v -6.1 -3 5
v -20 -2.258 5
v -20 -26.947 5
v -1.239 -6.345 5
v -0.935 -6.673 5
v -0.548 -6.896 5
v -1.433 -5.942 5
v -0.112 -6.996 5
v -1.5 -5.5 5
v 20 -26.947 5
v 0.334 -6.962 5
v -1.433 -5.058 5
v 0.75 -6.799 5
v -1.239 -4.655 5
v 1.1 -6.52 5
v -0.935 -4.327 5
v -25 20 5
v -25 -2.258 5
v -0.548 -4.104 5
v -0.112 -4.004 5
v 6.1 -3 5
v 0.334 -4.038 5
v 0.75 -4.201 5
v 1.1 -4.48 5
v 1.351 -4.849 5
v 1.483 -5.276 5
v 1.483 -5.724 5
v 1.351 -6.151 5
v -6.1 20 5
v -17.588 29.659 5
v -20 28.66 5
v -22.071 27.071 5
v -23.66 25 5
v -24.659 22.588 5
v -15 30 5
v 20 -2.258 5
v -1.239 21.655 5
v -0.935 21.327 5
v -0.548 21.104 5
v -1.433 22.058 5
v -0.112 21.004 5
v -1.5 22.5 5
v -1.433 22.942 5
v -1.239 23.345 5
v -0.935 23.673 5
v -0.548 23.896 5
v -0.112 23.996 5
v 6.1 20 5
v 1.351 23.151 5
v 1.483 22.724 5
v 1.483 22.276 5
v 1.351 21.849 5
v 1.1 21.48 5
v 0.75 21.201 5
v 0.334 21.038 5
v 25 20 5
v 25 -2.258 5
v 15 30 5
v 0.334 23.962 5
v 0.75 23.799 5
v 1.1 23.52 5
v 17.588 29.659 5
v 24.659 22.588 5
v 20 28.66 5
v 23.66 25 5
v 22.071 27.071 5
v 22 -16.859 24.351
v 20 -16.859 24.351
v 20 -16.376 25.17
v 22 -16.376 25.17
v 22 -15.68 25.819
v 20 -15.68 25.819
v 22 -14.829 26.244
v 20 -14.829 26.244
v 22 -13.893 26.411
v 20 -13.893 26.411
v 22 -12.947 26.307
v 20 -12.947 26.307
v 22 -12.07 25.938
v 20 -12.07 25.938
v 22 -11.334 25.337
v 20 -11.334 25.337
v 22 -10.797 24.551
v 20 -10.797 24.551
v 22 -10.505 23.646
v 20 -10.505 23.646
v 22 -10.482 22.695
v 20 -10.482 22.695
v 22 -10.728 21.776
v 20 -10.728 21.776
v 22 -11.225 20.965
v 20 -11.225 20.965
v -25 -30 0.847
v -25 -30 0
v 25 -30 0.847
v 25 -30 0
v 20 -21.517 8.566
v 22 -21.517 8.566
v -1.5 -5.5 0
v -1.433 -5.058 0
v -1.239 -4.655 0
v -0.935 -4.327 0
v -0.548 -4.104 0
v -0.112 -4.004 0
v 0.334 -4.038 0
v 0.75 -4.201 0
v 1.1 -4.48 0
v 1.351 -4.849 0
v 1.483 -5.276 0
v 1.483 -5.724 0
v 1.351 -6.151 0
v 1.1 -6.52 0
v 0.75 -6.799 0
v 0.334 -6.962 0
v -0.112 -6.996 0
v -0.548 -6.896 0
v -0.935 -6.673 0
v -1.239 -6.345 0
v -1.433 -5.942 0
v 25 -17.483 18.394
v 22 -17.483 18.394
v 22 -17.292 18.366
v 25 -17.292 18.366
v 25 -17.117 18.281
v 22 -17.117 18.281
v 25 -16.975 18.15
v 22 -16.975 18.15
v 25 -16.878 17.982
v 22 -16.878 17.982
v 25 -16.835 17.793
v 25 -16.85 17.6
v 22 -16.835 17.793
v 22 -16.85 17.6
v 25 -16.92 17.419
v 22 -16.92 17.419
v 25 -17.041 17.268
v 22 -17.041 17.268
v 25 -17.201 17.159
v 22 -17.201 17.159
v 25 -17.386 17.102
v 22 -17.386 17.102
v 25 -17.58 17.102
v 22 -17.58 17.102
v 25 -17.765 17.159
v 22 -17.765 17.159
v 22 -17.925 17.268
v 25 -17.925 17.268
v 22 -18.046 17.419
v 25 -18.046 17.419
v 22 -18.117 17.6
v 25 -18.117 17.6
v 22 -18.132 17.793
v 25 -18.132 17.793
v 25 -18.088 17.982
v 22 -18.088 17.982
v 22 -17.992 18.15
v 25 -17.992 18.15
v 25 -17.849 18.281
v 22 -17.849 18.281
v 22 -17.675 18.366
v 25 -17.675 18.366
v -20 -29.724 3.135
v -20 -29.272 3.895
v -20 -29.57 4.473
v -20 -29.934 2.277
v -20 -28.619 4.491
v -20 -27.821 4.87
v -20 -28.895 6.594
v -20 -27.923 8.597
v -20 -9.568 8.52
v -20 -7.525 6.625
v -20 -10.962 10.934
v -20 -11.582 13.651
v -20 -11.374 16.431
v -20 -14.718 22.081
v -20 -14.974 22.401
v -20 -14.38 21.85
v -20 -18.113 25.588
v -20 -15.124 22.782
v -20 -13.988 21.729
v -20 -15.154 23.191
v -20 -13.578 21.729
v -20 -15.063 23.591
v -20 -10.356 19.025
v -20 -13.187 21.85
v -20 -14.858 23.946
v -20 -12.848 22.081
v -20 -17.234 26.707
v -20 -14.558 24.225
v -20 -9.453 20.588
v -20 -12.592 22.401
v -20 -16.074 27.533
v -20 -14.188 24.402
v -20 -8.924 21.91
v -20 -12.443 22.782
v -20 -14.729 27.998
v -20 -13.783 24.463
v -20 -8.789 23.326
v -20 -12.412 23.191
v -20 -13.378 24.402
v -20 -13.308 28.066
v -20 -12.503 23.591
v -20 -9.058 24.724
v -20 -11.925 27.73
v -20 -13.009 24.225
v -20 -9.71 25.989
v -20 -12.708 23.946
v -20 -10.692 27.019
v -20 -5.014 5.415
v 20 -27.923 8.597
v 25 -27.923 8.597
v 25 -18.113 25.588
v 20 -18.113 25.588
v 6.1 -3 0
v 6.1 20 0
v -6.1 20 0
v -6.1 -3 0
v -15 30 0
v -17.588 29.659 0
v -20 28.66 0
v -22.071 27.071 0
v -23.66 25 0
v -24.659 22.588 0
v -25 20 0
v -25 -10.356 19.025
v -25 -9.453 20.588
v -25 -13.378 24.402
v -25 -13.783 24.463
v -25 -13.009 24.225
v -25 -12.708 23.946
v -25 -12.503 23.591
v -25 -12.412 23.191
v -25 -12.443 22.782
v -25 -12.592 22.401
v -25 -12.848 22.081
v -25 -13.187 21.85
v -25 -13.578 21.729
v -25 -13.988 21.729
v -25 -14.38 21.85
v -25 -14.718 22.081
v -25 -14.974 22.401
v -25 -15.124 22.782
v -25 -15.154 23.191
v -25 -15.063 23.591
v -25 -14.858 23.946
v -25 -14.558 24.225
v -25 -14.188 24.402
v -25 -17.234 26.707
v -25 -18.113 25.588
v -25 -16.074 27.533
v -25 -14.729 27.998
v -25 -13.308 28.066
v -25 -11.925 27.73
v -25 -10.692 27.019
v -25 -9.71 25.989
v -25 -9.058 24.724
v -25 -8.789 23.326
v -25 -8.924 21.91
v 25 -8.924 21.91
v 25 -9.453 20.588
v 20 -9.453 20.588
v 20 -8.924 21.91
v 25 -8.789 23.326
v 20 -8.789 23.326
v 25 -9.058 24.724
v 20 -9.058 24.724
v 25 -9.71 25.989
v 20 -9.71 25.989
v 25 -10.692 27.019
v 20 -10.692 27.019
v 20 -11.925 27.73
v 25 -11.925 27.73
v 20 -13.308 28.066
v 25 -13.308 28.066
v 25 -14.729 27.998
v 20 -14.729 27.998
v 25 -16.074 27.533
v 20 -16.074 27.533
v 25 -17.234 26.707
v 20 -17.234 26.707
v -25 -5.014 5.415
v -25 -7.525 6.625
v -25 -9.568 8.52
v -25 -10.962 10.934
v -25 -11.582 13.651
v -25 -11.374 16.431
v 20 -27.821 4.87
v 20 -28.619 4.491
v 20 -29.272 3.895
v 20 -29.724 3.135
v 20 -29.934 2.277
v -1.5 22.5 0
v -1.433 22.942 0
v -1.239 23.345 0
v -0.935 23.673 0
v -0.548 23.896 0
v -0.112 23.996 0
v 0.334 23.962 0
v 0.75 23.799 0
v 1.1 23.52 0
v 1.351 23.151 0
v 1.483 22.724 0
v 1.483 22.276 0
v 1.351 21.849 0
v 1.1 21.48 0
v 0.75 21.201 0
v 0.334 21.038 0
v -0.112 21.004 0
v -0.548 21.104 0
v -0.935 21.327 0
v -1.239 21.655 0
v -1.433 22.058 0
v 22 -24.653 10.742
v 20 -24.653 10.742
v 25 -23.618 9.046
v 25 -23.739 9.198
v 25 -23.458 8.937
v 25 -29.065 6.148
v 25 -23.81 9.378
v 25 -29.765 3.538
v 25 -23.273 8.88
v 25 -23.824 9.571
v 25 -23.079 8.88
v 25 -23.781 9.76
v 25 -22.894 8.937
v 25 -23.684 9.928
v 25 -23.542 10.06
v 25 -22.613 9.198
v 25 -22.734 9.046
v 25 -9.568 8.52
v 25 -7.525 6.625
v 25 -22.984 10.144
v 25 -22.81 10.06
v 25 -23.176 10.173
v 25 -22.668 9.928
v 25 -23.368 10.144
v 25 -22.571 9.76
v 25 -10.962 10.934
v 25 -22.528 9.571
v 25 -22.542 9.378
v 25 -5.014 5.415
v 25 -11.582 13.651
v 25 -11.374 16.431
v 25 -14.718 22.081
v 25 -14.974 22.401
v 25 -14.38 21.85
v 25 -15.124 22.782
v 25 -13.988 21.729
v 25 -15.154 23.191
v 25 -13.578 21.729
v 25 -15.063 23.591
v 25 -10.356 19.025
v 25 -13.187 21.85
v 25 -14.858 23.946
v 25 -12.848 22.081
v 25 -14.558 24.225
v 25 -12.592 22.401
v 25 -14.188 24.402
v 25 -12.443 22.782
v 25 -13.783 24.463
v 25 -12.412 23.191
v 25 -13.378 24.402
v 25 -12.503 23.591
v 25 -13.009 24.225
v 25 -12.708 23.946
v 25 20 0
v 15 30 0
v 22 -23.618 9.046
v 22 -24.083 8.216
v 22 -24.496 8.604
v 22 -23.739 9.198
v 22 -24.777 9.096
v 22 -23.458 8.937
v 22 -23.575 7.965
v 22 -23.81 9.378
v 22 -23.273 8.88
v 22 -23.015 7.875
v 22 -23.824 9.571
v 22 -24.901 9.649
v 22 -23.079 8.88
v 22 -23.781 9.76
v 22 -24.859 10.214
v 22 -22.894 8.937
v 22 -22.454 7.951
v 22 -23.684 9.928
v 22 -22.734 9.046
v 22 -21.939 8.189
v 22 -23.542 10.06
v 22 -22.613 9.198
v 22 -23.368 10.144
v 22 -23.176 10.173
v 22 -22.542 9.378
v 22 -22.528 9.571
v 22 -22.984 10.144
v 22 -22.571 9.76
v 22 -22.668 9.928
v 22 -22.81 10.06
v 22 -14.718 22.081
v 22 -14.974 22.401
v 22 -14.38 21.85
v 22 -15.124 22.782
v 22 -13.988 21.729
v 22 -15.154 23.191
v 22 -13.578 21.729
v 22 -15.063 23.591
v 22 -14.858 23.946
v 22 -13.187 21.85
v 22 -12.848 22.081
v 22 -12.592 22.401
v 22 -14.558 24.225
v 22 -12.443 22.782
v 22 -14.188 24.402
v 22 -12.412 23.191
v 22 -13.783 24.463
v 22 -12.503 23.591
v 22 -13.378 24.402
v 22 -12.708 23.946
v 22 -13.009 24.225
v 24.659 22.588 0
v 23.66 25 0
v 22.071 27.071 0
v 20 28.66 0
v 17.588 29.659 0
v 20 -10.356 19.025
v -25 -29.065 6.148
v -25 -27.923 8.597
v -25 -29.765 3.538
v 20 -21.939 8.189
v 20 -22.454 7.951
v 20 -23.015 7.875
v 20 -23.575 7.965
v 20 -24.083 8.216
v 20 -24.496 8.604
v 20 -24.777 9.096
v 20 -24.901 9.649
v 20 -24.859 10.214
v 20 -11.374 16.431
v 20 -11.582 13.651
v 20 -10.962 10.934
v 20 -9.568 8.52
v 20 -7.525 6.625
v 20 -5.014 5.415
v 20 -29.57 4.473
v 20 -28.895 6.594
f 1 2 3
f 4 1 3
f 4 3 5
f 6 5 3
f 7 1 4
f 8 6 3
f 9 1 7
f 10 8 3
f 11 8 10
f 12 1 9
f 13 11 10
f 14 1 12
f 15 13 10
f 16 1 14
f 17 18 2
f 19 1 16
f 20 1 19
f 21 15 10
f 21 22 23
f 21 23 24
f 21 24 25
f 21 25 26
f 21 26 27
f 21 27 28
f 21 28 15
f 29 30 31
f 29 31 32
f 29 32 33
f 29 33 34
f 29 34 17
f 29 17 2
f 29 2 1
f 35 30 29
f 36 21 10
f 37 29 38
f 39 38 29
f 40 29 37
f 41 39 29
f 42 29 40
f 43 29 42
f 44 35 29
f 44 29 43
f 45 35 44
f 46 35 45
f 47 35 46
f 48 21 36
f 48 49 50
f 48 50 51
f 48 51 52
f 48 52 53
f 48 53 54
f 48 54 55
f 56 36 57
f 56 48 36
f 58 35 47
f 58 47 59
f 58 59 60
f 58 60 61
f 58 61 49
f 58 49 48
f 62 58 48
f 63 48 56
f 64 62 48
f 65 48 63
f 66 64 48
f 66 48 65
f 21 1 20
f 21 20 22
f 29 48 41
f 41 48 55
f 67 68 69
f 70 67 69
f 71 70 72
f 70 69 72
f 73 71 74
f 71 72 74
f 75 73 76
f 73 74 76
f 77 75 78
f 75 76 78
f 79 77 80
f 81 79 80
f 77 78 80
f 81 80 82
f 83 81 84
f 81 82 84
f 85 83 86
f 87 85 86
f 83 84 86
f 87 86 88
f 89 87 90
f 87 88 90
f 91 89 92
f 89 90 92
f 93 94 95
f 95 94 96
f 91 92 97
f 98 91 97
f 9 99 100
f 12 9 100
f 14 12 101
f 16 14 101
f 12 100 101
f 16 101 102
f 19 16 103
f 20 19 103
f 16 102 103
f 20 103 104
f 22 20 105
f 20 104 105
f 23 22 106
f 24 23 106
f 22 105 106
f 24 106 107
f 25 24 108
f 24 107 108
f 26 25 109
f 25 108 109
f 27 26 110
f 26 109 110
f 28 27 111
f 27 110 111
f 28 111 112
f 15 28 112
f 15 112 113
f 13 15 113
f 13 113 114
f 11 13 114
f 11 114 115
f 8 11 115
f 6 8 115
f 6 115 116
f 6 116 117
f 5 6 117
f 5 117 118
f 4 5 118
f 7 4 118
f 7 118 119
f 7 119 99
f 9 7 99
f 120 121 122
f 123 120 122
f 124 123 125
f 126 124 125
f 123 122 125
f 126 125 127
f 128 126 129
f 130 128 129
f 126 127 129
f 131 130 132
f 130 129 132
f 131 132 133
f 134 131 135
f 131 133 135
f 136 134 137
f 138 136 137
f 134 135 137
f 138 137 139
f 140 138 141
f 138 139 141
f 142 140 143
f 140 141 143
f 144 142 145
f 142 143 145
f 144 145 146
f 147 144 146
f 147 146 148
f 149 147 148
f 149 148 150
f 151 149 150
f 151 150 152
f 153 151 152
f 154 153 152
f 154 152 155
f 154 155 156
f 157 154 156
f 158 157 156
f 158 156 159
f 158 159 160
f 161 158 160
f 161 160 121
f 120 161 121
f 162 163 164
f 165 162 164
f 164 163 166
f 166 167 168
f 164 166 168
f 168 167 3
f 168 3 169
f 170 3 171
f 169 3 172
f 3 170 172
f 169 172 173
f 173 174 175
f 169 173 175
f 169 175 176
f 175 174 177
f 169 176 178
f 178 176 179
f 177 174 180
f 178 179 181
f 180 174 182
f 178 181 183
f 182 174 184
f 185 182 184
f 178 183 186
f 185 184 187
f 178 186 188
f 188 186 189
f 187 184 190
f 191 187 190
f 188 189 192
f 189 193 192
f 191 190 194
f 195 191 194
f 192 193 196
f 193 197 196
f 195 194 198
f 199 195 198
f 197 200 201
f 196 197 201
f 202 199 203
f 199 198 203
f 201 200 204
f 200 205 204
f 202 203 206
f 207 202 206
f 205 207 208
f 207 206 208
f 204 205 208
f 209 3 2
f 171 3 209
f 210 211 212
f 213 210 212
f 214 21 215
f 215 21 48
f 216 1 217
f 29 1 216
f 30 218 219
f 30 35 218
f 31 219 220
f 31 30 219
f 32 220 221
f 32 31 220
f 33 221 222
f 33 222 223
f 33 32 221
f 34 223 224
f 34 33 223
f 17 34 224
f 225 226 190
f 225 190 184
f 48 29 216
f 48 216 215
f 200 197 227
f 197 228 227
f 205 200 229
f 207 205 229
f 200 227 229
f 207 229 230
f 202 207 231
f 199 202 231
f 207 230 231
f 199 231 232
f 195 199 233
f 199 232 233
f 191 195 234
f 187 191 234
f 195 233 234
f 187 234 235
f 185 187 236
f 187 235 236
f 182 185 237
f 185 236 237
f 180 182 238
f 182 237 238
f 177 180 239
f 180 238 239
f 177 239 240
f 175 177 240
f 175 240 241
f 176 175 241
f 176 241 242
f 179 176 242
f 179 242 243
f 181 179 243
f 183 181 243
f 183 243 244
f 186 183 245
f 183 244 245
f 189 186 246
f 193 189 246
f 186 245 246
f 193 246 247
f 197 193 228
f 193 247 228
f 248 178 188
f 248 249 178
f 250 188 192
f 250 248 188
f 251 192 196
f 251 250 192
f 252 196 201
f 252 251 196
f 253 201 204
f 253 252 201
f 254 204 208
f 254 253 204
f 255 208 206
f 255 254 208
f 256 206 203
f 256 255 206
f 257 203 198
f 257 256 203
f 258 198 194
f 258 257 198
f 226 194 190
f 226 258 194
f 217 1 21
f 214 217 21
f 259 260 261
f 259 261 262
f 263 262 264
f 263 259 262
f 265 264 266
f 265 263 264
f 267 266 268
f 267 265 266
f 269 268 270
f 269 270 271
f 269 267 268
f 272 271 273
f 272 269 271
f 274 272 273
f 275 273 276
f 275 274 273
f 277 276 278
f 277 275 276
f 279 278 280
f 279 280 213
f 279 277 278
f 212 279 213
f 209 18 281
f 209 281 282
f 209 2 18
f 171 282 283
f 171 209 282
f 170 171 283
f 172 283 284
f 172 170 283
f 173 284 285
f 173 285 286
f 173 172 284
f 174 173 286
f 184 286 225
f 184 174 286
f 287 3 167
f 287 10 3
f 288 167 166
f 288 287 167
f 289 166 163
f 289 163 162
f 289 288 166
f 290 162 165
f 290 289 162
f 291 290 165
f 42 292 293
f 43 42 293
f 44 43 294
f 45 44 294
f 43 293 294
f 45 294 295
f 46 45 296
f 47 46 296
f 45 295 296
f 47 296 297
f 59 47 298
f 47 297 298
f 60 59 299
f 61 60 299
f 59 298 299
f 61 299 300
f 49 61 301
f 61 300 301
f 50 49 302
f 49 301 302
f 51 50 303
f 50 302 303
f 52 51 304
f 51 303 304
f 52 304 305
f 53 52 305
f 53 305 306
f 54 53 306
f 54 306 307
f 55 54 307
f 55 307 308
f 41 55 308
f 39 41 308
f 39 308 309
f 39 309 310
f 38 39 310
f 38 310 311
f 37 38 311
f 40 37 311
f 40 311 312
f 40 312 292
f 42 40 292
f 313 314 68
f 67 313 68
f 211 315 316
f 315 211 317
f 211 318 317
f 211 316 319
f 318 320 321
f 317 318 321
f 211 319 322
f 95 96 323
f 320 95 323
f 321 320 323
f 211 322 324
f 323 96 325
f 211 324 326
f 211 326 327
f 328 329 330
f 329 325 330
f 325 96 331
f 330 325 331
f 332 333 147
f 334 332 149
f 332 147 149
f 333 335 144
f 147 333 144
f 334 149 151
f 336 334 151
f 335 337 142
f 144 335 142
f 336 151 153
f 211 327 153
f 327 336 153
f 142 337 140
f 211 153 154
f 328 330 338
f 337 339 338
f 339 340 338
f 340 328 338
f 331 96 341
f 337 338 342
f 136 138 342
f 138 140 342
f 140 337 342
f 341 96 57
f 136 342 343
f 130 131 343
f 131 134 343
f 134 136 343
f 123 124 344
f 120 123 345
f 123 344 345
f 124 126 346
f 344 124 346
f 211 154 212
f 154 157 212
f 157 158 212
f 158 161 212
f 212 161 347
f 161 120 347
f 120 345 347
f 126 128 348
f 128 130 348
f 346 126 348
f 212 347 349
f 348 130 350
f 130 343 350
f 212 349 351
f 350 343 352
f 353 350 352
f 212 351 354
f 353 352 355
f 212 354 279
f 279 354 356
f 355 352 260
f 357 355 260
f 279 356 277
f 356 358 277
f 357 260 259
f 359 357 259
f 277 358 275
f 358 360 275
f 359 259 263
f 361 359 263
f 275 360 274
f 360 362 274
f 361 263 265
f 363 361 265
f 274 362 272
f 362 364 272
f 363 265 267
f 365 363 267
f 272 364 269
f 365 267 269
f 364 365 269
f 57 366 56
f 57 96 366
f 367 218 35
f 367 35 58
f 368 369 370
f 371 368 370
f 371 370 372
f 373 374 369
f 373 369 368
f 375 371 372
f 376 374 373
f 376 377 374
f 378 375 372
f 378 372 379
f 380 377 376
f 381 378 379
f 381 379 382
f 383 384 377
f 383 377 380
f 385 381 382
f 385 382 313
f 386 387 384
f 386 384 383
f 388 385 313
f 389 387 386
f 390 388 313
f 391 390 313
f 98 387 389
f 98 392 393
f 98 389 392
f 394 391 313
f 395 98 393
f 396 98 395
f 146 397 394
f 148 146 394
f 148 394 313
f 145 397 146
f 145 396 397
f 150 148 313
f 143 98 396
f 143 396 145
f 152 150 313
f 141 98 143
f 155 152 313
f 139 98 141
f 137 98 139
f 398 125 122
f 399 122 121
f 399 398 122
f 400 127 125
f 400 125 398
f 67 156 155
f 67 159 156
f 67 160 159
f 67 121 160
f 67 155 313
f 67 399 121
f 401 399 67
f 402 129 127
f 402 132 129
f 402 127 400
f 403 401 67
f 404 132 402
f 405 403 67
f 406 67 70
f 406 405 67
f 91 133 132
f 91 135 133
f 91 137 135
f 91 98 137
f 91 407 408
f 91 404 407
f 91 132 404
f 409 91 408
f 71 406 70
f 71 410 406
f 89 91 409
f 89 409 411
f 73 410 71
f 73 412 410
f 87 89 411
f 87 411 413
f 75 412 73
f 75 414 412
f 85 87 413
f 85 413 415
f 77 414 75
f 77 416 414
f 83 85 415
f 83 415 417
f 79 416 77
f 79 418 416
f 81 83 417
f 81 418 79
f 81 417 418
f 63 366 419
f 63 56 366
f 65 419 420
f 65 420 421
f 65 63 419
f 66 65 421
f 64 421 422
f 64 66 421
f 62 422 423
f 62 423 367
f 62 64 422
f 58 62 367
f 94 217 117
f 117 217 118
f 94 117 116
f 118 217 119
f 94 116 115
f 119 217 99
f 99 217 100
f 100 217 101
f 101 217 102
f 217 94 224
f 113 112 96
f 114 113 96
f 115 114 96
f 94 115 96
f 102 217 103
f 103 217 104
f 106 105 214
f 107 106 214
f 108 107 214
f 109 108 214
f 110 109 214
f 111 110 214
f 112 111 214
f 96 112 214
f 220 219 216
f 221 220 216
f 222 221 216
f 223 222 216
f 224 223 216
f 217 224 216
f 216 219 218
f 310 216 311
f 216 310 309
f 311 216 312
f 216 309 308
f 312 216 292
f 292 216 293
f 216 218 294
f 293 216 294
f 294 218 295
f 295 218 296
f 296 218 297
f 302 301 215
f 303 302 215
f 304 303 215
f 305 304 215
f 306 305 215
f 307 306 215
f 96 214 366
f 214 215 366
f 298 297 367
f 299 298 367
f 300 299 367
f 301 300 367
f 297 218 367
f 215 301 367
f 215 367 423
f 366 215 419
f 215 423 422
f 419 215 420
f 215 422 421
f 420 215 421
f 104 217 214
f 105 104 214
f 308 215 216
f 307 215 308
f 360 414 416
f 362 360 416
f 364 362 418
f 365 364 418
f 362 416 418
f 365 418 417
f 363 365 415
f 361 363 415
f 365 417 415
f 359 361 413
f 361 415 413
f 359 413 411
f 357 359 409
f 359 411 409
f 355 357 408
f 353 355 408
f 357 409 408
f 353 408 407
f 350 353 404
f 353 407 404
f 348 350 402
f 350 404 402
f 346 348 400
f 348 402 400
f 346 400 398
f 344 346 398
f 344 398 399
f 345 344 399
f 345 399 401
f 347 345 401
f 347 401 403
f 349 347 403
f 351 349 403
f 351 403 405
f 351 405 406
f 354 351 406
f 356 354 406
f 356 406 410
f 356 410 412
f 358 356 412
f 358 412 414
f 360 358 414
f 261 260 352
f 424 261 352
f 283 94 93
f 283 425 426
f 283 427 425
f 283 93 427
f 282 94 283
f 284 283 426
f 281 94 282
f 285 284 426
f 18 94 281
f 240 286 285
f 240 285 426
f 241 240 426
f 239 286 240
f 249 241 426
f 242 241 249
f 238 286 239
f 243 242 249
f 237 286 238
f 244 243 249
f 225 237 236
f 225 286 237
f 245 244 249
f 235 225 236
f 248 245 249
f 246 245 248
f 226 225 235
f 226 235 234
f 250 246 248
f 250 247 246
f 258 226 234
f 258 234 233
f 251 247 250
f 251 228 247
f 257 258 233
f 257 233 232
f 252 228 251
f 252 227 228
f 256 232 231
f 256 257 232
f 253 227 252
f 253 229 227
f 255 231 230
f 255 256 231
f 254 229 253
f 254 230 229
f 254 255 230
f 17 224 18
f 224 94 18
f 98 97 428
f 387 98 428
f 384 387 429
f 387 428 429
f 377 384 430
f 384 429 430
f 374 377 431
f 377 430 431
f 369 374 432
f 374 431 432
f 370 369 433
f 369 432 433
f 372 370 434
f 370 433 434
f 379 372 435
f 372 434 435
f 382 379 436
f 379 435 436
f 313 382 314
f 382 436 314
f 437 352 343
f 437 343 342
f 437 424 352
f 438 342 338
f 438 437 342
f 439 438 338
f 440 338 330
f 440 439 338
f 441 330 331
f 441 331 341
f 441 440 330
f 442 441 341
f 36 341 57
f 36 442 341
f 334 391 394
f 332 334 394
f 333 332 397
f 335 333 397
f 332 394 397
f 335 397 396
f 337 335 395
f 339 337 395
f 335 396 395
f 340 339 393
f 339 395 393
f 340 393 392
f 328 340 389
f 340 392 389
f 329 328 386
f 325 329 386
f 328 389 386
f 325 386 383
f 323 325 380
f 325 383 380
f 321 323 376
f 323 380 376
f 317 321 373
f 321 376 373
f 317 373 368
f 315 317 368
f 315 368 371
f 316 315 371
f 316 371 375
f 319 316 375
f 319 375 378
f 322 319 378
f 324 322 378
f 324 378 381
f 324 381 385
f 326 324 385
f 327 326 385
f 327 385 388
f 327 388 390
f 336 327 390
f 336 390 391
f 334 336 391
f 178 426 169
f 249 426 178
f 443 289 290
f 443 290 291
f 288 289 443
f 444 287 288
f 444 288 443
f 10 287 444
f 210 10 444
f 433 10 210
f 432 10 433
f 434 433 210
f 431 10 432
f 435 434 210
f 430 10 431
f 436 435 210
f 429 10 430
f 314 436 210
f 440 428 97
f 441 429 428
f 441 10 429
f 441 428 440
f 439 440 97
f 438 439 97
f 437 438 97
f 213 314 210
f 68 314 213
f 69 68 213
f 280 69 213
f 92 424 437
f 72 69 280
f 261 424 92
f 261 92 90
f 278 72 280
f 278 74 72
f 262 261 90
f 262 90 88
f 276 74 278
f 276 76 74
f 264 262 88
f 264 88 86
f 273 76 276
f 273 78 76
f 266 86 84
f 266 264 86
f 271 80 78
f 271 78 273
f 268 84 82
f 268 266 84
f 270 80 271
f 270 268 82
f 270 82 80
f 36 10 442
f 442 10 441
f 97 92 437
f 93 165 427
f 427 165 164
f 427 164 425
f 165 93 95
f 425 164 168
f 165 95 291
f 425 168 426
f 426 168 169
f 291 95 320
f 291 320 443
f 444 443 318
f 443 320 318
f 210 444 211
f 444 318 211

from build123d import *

# Parameters (mm, degrees)
ESQUISSE1_W                  = 50
ESQUISSE1_H                  = 60
BOSS_EXTRU_1_DEPTH           = 5
ESQUISSE2_W                  = 12.2
ESQUISSE2_H                  = 23
ENL_V_MAT_EXTRU_1_DEPTH      = 40.37003937
ESQUISSE3_R                  = 1.5
ENL_V_MAT_EXTRU_2_DEPTH      = 40.37003937
BOSS_EXTRU_2_DEPTH           = 5
CONG_1_RADIUS                = 5
CONG_1_LENGTH                = 5
CONG_2_R                     = 9.35
ENL_V_MAT_EXTRU_3_DEPTH      = 2
ESQUISSE6_R                  = 0.65
ESQUISSE6_R_2                = 1.375
ENL_V_MAT_EXTRU_4_DEPTH      = 61.942279509
CONG_1_OF_SYM_TRIE1_2_RADIUS = 5
CONG_1_OF_SYM_TRIE1_2_LENGTH = 5
CONG_2_OF_SYM_TRIE1_R        = 9.35
ESQUISSE7_R                  = 1.375
ENL_V_MAT_EXTRU_5_DEPTH      = 65.722186549
CONG_3_R                     = 15.5
CONG_4_R                     = 3
CONG_5_R                     = 10


with BuildPart() as part:
    # Esquisse1 → Boss.-Extru.1 (new body)
    with BuildSketch(Plane.XY):
        Rectangle(ESQUISSE1_W, ESQUISSE1_H)
    extrude(amount=BOSS_EXTRU_1_DEPTH)

    # Esquisse2 → Enlèv. mat.-Extru.1 (cut, through all)
    with BuildSketch(Plane.XY.offset(5)):
        with Locations((0, 8.5)):
            Rectangle(ESQUISSE2_W, ESQUISSE2_H)
    extrude(amount=-ENL_V_MAT_EXTRU_1_DEPTH, mode=Mode.SUBTRACT)

    # Esquisse3 → Enlèv. mat.-Extru.2 (cut, through all)
    with BuildSketch(Plane(origin=(0, 0, 0), x_dir=(-1, 0, 0), z_dir=(0, 0, -1))):
        with Locations((0, -5.5)):
            Circle(ESQUISSE3_R)
        with Locations((0, 22.5)):
            Circle(ESQUISSE3_R)
    extrude(amount=-ENL_V_MAT_EXTRU_2_DEPTH, mode=Mode.SUBTRACT)

    # Esquisse4 → Boss.-Extru.2 (add)
    with BuildSketch(Plane(origin=(25, 0, 0), x_dir=(0, 0, -1), z_dir=(1, 0, 0))):
        Polygon((-5, -30), (-29.918584287, -15.613248654), (-24.918584287, -6.952994616), (-5, -18.452994616), align=None)
    boss_extru_2 = extrude(amount=-BOSS_EXTRU_2_DEPTH)

    # Congé1: full round fillet: the end face becomes a half cylinder, R = half its width
    cong_1_face = Plane((22.5, -11.283121635, 27.418584287), x_dir=(1, 0, 0), z_dir=(0, 0.5, 0.866025403784))  # on the end face: x along it, z out of the body
    cong_1_slab = cong_1_face.offset(-CONG_1_RADIUS / 2) * Box(CONG_1_LENGTH, 2 * CONG_1_RADIUS, CONG_1_RADIUS, mode=Mode.PRIVATE)  # the body's end, R deep
    cong_1_round = Plane((22.5, -13.783121635, 23.088457268), x_dir=(0, 0.5, 0.866025403784), z_dir=(1, 0, 0)) * Cylinder(CONG_1_RADIUS, CONG_1_LENGTH, mode=Mode.PRIVATE)  # its axis R under the face
    add(cong_1_slab - cong_1_round, mode=Mode.SUBTRACT)

    # Congé2
    cong_2_edges = [part.edges().sort_by_distance(p)[0] for p in [
        (22.5, -18.452994616, 5),
    ]]
    fillet(cong_2_edges, radius=CONG_2_R)

    # Esquisse5 → Enlèv. mat.-Extru.3 (cut)
    with BuildSketch(Plane.ZY.offset(-20)):
        with BuildLine():
            Line((10.742191848, -24.653283165), (24.350818961, -16.858928401))
            ThreePointArc((24.350818961, -16.858928401), (25.938192754, -12.070476908), (20.964861107, -11.224902792))
            Line((20.964861107, -11.224902792), (8.56647232, -21.51689595))
            ThreePointArc((8.56647232, -21.51689595), (8.216016866, -24.082852363), (10.742191848, -24.653283165))
        make_face()
    extrude(amount=-ENL_V_MAT_EXTRU_3_DEPTH, mode=Mode.SUBTRACT)

    # Esquisse6 → Enlèv. mat.-Extru.4 (cut, through all)
    with BuildSketch(Plane.ZY.offset(-20)):
        with Locations((9.522873524, -23.175934722)):
            Circle(ESQUISSE6_R)
        with Locations((17.74443943, -17.48332073)):
            Circle(ESQUISSE6_R)
        with Locations((23.088457268, -13.783121635)):
            Circle(ESQUISSE6_R_2)
    extrude(amount=-ENL_V_MAT_EXTRU_4_DEPTH, mode=Mode.SUBTRACT)

    # Symétrie1: Boss.-Extru.2 across plane
    add(boss_extru_2.mirror(Plane(origin=(0, 0, 0), x_dir=(0, 0, 1), z_dir=(1, 0, 0))))

    # Congé1 of Sym_trie1 2: full round fillet: the end face becomes a half cylinder, R = half its width
    cong_1_of_sym_trie1_2_face = Plane((-22.5, -11.283121635, 27.418584287), x_dir=(-1, 0, 0), z_dir=(0, 0.5, 0.866025403784))  # on the end face: x along it, z out of the body
    cong_1_of_sym_trie1_2_slab = cong_1_of_sym_trie1_2_face.offset(-CONG_1_OF_SYM_TRIE1_2_RADIUS / 2) * Box(CONG_1_OF_SYM_TRIE1_2_LENGTH, 2 * CONG_1_OF_SYM_TRIE1_2_RADIUS, CONG_1_OF_SYM_TRIE1_2_RADIUS, mode=Mode.PRIVATE)  # the body's end, R deep
    cong_1_of_sym_trie1_2_round = Plane((-22.5, -13.783121635, 23.088457268), x_dir=(0, 0.5, 0.866025403784), z_dir=(-1, 0, 0)) * Cylinder(CONG_1_OF_SYM_TRIE1_2_RADIUS, CONG_1_OF_SYM_TRIE1_2_LENGTH, mode=Mode.PRIVATE)  # its axis R under the face
    add(cong_1_of_sym_trie1_2_slab - cong_1_of_sym_trie1_2_round, mode=Mode.SUBTRACT)

    # Congé2 of Symétrie1
    cong_2_of_sym_trie1_edges = [part.edges().sort_by_distance(p)[0] for p in [
        (-22.5, -18.452994616, 5),
    ]]
    fillet(cong_2_of_sym_trie1_edges, radius=CONG_2_OF_SYM_TRIE1_R)

    # Esquisse7 → Enlèv. mat.-Extru.5 (cut, through all)
    with BuildSketch(Plane.ZY.offset(25)):
        with Locations((23.088457268, -13.783121635)):
            Circle(ESQUISSE7_R)
    extrude(amount=-ENL_V_MAT_EXTRU_5_DEPTH, mode=Mode.SUBTRACT)

    # Congé3
    # the kernel refuses this fillet: 15.5 mm, written as the material it takes off along each edge
    with BuildSketch(Plane(origin=(4.919274896, -30, 5), x_dir=(0, 0, -1), z_dir=(-1, 0, 0)), Plane(origin=(49.919274896, -30, 5), x_dir=(0, 0, -1), z_dir=(-1, 0, 0))) as cong_3_piece_1:
        with BuildLine():
            CenterArc((CONG_3_R * 0.267949192431, -CONG_3_R), CONG_3_R, 90, 30)
            Line((-CONG_3_R * 0.232050807569, -CONG_3_R * 0.133974596216), (-CONG_3_R * 0.242050807569, -CONG_3_R * 0.11665408814))
            Line((-CONG_3_R * 0.242050807569, -CONG_3_R * 0.11665408814), (-CONG_3_R * 0.00535898384862, CONG_3_R * 0.02))
            Line((-CONG_3_R * 0.00535898384862, CONG_3_R * 0.02), (CONG_3_R * 0.267949192431, CONG_3_R * 0.02))
            Line((CONG_3_R * 0.267949192431, CONG_3_R * 0.02), (CONG_3_R * 0.267949192431, 0))
        make_face()
    extrude(amount=54.838549792, mode=Mode.SUBTRACT)

    # Congé4
    cong_4_edges = [part.edges().sort_by_distance(p)[0] for p in [
        (0, -29.433212182, 5),
    ]]
    fillet(cong_4_edges, radius=CONG_4_R)

    # Congé5
    cong_5_edges = [part.edges().sort_by_distance(p)[0] for p in [
        (-25, 30, 2.5),
        (25, 30, 2.5),
    ]]
    fillet(cong_5_edges, radius=CONG_5_R)


solid = part.part
